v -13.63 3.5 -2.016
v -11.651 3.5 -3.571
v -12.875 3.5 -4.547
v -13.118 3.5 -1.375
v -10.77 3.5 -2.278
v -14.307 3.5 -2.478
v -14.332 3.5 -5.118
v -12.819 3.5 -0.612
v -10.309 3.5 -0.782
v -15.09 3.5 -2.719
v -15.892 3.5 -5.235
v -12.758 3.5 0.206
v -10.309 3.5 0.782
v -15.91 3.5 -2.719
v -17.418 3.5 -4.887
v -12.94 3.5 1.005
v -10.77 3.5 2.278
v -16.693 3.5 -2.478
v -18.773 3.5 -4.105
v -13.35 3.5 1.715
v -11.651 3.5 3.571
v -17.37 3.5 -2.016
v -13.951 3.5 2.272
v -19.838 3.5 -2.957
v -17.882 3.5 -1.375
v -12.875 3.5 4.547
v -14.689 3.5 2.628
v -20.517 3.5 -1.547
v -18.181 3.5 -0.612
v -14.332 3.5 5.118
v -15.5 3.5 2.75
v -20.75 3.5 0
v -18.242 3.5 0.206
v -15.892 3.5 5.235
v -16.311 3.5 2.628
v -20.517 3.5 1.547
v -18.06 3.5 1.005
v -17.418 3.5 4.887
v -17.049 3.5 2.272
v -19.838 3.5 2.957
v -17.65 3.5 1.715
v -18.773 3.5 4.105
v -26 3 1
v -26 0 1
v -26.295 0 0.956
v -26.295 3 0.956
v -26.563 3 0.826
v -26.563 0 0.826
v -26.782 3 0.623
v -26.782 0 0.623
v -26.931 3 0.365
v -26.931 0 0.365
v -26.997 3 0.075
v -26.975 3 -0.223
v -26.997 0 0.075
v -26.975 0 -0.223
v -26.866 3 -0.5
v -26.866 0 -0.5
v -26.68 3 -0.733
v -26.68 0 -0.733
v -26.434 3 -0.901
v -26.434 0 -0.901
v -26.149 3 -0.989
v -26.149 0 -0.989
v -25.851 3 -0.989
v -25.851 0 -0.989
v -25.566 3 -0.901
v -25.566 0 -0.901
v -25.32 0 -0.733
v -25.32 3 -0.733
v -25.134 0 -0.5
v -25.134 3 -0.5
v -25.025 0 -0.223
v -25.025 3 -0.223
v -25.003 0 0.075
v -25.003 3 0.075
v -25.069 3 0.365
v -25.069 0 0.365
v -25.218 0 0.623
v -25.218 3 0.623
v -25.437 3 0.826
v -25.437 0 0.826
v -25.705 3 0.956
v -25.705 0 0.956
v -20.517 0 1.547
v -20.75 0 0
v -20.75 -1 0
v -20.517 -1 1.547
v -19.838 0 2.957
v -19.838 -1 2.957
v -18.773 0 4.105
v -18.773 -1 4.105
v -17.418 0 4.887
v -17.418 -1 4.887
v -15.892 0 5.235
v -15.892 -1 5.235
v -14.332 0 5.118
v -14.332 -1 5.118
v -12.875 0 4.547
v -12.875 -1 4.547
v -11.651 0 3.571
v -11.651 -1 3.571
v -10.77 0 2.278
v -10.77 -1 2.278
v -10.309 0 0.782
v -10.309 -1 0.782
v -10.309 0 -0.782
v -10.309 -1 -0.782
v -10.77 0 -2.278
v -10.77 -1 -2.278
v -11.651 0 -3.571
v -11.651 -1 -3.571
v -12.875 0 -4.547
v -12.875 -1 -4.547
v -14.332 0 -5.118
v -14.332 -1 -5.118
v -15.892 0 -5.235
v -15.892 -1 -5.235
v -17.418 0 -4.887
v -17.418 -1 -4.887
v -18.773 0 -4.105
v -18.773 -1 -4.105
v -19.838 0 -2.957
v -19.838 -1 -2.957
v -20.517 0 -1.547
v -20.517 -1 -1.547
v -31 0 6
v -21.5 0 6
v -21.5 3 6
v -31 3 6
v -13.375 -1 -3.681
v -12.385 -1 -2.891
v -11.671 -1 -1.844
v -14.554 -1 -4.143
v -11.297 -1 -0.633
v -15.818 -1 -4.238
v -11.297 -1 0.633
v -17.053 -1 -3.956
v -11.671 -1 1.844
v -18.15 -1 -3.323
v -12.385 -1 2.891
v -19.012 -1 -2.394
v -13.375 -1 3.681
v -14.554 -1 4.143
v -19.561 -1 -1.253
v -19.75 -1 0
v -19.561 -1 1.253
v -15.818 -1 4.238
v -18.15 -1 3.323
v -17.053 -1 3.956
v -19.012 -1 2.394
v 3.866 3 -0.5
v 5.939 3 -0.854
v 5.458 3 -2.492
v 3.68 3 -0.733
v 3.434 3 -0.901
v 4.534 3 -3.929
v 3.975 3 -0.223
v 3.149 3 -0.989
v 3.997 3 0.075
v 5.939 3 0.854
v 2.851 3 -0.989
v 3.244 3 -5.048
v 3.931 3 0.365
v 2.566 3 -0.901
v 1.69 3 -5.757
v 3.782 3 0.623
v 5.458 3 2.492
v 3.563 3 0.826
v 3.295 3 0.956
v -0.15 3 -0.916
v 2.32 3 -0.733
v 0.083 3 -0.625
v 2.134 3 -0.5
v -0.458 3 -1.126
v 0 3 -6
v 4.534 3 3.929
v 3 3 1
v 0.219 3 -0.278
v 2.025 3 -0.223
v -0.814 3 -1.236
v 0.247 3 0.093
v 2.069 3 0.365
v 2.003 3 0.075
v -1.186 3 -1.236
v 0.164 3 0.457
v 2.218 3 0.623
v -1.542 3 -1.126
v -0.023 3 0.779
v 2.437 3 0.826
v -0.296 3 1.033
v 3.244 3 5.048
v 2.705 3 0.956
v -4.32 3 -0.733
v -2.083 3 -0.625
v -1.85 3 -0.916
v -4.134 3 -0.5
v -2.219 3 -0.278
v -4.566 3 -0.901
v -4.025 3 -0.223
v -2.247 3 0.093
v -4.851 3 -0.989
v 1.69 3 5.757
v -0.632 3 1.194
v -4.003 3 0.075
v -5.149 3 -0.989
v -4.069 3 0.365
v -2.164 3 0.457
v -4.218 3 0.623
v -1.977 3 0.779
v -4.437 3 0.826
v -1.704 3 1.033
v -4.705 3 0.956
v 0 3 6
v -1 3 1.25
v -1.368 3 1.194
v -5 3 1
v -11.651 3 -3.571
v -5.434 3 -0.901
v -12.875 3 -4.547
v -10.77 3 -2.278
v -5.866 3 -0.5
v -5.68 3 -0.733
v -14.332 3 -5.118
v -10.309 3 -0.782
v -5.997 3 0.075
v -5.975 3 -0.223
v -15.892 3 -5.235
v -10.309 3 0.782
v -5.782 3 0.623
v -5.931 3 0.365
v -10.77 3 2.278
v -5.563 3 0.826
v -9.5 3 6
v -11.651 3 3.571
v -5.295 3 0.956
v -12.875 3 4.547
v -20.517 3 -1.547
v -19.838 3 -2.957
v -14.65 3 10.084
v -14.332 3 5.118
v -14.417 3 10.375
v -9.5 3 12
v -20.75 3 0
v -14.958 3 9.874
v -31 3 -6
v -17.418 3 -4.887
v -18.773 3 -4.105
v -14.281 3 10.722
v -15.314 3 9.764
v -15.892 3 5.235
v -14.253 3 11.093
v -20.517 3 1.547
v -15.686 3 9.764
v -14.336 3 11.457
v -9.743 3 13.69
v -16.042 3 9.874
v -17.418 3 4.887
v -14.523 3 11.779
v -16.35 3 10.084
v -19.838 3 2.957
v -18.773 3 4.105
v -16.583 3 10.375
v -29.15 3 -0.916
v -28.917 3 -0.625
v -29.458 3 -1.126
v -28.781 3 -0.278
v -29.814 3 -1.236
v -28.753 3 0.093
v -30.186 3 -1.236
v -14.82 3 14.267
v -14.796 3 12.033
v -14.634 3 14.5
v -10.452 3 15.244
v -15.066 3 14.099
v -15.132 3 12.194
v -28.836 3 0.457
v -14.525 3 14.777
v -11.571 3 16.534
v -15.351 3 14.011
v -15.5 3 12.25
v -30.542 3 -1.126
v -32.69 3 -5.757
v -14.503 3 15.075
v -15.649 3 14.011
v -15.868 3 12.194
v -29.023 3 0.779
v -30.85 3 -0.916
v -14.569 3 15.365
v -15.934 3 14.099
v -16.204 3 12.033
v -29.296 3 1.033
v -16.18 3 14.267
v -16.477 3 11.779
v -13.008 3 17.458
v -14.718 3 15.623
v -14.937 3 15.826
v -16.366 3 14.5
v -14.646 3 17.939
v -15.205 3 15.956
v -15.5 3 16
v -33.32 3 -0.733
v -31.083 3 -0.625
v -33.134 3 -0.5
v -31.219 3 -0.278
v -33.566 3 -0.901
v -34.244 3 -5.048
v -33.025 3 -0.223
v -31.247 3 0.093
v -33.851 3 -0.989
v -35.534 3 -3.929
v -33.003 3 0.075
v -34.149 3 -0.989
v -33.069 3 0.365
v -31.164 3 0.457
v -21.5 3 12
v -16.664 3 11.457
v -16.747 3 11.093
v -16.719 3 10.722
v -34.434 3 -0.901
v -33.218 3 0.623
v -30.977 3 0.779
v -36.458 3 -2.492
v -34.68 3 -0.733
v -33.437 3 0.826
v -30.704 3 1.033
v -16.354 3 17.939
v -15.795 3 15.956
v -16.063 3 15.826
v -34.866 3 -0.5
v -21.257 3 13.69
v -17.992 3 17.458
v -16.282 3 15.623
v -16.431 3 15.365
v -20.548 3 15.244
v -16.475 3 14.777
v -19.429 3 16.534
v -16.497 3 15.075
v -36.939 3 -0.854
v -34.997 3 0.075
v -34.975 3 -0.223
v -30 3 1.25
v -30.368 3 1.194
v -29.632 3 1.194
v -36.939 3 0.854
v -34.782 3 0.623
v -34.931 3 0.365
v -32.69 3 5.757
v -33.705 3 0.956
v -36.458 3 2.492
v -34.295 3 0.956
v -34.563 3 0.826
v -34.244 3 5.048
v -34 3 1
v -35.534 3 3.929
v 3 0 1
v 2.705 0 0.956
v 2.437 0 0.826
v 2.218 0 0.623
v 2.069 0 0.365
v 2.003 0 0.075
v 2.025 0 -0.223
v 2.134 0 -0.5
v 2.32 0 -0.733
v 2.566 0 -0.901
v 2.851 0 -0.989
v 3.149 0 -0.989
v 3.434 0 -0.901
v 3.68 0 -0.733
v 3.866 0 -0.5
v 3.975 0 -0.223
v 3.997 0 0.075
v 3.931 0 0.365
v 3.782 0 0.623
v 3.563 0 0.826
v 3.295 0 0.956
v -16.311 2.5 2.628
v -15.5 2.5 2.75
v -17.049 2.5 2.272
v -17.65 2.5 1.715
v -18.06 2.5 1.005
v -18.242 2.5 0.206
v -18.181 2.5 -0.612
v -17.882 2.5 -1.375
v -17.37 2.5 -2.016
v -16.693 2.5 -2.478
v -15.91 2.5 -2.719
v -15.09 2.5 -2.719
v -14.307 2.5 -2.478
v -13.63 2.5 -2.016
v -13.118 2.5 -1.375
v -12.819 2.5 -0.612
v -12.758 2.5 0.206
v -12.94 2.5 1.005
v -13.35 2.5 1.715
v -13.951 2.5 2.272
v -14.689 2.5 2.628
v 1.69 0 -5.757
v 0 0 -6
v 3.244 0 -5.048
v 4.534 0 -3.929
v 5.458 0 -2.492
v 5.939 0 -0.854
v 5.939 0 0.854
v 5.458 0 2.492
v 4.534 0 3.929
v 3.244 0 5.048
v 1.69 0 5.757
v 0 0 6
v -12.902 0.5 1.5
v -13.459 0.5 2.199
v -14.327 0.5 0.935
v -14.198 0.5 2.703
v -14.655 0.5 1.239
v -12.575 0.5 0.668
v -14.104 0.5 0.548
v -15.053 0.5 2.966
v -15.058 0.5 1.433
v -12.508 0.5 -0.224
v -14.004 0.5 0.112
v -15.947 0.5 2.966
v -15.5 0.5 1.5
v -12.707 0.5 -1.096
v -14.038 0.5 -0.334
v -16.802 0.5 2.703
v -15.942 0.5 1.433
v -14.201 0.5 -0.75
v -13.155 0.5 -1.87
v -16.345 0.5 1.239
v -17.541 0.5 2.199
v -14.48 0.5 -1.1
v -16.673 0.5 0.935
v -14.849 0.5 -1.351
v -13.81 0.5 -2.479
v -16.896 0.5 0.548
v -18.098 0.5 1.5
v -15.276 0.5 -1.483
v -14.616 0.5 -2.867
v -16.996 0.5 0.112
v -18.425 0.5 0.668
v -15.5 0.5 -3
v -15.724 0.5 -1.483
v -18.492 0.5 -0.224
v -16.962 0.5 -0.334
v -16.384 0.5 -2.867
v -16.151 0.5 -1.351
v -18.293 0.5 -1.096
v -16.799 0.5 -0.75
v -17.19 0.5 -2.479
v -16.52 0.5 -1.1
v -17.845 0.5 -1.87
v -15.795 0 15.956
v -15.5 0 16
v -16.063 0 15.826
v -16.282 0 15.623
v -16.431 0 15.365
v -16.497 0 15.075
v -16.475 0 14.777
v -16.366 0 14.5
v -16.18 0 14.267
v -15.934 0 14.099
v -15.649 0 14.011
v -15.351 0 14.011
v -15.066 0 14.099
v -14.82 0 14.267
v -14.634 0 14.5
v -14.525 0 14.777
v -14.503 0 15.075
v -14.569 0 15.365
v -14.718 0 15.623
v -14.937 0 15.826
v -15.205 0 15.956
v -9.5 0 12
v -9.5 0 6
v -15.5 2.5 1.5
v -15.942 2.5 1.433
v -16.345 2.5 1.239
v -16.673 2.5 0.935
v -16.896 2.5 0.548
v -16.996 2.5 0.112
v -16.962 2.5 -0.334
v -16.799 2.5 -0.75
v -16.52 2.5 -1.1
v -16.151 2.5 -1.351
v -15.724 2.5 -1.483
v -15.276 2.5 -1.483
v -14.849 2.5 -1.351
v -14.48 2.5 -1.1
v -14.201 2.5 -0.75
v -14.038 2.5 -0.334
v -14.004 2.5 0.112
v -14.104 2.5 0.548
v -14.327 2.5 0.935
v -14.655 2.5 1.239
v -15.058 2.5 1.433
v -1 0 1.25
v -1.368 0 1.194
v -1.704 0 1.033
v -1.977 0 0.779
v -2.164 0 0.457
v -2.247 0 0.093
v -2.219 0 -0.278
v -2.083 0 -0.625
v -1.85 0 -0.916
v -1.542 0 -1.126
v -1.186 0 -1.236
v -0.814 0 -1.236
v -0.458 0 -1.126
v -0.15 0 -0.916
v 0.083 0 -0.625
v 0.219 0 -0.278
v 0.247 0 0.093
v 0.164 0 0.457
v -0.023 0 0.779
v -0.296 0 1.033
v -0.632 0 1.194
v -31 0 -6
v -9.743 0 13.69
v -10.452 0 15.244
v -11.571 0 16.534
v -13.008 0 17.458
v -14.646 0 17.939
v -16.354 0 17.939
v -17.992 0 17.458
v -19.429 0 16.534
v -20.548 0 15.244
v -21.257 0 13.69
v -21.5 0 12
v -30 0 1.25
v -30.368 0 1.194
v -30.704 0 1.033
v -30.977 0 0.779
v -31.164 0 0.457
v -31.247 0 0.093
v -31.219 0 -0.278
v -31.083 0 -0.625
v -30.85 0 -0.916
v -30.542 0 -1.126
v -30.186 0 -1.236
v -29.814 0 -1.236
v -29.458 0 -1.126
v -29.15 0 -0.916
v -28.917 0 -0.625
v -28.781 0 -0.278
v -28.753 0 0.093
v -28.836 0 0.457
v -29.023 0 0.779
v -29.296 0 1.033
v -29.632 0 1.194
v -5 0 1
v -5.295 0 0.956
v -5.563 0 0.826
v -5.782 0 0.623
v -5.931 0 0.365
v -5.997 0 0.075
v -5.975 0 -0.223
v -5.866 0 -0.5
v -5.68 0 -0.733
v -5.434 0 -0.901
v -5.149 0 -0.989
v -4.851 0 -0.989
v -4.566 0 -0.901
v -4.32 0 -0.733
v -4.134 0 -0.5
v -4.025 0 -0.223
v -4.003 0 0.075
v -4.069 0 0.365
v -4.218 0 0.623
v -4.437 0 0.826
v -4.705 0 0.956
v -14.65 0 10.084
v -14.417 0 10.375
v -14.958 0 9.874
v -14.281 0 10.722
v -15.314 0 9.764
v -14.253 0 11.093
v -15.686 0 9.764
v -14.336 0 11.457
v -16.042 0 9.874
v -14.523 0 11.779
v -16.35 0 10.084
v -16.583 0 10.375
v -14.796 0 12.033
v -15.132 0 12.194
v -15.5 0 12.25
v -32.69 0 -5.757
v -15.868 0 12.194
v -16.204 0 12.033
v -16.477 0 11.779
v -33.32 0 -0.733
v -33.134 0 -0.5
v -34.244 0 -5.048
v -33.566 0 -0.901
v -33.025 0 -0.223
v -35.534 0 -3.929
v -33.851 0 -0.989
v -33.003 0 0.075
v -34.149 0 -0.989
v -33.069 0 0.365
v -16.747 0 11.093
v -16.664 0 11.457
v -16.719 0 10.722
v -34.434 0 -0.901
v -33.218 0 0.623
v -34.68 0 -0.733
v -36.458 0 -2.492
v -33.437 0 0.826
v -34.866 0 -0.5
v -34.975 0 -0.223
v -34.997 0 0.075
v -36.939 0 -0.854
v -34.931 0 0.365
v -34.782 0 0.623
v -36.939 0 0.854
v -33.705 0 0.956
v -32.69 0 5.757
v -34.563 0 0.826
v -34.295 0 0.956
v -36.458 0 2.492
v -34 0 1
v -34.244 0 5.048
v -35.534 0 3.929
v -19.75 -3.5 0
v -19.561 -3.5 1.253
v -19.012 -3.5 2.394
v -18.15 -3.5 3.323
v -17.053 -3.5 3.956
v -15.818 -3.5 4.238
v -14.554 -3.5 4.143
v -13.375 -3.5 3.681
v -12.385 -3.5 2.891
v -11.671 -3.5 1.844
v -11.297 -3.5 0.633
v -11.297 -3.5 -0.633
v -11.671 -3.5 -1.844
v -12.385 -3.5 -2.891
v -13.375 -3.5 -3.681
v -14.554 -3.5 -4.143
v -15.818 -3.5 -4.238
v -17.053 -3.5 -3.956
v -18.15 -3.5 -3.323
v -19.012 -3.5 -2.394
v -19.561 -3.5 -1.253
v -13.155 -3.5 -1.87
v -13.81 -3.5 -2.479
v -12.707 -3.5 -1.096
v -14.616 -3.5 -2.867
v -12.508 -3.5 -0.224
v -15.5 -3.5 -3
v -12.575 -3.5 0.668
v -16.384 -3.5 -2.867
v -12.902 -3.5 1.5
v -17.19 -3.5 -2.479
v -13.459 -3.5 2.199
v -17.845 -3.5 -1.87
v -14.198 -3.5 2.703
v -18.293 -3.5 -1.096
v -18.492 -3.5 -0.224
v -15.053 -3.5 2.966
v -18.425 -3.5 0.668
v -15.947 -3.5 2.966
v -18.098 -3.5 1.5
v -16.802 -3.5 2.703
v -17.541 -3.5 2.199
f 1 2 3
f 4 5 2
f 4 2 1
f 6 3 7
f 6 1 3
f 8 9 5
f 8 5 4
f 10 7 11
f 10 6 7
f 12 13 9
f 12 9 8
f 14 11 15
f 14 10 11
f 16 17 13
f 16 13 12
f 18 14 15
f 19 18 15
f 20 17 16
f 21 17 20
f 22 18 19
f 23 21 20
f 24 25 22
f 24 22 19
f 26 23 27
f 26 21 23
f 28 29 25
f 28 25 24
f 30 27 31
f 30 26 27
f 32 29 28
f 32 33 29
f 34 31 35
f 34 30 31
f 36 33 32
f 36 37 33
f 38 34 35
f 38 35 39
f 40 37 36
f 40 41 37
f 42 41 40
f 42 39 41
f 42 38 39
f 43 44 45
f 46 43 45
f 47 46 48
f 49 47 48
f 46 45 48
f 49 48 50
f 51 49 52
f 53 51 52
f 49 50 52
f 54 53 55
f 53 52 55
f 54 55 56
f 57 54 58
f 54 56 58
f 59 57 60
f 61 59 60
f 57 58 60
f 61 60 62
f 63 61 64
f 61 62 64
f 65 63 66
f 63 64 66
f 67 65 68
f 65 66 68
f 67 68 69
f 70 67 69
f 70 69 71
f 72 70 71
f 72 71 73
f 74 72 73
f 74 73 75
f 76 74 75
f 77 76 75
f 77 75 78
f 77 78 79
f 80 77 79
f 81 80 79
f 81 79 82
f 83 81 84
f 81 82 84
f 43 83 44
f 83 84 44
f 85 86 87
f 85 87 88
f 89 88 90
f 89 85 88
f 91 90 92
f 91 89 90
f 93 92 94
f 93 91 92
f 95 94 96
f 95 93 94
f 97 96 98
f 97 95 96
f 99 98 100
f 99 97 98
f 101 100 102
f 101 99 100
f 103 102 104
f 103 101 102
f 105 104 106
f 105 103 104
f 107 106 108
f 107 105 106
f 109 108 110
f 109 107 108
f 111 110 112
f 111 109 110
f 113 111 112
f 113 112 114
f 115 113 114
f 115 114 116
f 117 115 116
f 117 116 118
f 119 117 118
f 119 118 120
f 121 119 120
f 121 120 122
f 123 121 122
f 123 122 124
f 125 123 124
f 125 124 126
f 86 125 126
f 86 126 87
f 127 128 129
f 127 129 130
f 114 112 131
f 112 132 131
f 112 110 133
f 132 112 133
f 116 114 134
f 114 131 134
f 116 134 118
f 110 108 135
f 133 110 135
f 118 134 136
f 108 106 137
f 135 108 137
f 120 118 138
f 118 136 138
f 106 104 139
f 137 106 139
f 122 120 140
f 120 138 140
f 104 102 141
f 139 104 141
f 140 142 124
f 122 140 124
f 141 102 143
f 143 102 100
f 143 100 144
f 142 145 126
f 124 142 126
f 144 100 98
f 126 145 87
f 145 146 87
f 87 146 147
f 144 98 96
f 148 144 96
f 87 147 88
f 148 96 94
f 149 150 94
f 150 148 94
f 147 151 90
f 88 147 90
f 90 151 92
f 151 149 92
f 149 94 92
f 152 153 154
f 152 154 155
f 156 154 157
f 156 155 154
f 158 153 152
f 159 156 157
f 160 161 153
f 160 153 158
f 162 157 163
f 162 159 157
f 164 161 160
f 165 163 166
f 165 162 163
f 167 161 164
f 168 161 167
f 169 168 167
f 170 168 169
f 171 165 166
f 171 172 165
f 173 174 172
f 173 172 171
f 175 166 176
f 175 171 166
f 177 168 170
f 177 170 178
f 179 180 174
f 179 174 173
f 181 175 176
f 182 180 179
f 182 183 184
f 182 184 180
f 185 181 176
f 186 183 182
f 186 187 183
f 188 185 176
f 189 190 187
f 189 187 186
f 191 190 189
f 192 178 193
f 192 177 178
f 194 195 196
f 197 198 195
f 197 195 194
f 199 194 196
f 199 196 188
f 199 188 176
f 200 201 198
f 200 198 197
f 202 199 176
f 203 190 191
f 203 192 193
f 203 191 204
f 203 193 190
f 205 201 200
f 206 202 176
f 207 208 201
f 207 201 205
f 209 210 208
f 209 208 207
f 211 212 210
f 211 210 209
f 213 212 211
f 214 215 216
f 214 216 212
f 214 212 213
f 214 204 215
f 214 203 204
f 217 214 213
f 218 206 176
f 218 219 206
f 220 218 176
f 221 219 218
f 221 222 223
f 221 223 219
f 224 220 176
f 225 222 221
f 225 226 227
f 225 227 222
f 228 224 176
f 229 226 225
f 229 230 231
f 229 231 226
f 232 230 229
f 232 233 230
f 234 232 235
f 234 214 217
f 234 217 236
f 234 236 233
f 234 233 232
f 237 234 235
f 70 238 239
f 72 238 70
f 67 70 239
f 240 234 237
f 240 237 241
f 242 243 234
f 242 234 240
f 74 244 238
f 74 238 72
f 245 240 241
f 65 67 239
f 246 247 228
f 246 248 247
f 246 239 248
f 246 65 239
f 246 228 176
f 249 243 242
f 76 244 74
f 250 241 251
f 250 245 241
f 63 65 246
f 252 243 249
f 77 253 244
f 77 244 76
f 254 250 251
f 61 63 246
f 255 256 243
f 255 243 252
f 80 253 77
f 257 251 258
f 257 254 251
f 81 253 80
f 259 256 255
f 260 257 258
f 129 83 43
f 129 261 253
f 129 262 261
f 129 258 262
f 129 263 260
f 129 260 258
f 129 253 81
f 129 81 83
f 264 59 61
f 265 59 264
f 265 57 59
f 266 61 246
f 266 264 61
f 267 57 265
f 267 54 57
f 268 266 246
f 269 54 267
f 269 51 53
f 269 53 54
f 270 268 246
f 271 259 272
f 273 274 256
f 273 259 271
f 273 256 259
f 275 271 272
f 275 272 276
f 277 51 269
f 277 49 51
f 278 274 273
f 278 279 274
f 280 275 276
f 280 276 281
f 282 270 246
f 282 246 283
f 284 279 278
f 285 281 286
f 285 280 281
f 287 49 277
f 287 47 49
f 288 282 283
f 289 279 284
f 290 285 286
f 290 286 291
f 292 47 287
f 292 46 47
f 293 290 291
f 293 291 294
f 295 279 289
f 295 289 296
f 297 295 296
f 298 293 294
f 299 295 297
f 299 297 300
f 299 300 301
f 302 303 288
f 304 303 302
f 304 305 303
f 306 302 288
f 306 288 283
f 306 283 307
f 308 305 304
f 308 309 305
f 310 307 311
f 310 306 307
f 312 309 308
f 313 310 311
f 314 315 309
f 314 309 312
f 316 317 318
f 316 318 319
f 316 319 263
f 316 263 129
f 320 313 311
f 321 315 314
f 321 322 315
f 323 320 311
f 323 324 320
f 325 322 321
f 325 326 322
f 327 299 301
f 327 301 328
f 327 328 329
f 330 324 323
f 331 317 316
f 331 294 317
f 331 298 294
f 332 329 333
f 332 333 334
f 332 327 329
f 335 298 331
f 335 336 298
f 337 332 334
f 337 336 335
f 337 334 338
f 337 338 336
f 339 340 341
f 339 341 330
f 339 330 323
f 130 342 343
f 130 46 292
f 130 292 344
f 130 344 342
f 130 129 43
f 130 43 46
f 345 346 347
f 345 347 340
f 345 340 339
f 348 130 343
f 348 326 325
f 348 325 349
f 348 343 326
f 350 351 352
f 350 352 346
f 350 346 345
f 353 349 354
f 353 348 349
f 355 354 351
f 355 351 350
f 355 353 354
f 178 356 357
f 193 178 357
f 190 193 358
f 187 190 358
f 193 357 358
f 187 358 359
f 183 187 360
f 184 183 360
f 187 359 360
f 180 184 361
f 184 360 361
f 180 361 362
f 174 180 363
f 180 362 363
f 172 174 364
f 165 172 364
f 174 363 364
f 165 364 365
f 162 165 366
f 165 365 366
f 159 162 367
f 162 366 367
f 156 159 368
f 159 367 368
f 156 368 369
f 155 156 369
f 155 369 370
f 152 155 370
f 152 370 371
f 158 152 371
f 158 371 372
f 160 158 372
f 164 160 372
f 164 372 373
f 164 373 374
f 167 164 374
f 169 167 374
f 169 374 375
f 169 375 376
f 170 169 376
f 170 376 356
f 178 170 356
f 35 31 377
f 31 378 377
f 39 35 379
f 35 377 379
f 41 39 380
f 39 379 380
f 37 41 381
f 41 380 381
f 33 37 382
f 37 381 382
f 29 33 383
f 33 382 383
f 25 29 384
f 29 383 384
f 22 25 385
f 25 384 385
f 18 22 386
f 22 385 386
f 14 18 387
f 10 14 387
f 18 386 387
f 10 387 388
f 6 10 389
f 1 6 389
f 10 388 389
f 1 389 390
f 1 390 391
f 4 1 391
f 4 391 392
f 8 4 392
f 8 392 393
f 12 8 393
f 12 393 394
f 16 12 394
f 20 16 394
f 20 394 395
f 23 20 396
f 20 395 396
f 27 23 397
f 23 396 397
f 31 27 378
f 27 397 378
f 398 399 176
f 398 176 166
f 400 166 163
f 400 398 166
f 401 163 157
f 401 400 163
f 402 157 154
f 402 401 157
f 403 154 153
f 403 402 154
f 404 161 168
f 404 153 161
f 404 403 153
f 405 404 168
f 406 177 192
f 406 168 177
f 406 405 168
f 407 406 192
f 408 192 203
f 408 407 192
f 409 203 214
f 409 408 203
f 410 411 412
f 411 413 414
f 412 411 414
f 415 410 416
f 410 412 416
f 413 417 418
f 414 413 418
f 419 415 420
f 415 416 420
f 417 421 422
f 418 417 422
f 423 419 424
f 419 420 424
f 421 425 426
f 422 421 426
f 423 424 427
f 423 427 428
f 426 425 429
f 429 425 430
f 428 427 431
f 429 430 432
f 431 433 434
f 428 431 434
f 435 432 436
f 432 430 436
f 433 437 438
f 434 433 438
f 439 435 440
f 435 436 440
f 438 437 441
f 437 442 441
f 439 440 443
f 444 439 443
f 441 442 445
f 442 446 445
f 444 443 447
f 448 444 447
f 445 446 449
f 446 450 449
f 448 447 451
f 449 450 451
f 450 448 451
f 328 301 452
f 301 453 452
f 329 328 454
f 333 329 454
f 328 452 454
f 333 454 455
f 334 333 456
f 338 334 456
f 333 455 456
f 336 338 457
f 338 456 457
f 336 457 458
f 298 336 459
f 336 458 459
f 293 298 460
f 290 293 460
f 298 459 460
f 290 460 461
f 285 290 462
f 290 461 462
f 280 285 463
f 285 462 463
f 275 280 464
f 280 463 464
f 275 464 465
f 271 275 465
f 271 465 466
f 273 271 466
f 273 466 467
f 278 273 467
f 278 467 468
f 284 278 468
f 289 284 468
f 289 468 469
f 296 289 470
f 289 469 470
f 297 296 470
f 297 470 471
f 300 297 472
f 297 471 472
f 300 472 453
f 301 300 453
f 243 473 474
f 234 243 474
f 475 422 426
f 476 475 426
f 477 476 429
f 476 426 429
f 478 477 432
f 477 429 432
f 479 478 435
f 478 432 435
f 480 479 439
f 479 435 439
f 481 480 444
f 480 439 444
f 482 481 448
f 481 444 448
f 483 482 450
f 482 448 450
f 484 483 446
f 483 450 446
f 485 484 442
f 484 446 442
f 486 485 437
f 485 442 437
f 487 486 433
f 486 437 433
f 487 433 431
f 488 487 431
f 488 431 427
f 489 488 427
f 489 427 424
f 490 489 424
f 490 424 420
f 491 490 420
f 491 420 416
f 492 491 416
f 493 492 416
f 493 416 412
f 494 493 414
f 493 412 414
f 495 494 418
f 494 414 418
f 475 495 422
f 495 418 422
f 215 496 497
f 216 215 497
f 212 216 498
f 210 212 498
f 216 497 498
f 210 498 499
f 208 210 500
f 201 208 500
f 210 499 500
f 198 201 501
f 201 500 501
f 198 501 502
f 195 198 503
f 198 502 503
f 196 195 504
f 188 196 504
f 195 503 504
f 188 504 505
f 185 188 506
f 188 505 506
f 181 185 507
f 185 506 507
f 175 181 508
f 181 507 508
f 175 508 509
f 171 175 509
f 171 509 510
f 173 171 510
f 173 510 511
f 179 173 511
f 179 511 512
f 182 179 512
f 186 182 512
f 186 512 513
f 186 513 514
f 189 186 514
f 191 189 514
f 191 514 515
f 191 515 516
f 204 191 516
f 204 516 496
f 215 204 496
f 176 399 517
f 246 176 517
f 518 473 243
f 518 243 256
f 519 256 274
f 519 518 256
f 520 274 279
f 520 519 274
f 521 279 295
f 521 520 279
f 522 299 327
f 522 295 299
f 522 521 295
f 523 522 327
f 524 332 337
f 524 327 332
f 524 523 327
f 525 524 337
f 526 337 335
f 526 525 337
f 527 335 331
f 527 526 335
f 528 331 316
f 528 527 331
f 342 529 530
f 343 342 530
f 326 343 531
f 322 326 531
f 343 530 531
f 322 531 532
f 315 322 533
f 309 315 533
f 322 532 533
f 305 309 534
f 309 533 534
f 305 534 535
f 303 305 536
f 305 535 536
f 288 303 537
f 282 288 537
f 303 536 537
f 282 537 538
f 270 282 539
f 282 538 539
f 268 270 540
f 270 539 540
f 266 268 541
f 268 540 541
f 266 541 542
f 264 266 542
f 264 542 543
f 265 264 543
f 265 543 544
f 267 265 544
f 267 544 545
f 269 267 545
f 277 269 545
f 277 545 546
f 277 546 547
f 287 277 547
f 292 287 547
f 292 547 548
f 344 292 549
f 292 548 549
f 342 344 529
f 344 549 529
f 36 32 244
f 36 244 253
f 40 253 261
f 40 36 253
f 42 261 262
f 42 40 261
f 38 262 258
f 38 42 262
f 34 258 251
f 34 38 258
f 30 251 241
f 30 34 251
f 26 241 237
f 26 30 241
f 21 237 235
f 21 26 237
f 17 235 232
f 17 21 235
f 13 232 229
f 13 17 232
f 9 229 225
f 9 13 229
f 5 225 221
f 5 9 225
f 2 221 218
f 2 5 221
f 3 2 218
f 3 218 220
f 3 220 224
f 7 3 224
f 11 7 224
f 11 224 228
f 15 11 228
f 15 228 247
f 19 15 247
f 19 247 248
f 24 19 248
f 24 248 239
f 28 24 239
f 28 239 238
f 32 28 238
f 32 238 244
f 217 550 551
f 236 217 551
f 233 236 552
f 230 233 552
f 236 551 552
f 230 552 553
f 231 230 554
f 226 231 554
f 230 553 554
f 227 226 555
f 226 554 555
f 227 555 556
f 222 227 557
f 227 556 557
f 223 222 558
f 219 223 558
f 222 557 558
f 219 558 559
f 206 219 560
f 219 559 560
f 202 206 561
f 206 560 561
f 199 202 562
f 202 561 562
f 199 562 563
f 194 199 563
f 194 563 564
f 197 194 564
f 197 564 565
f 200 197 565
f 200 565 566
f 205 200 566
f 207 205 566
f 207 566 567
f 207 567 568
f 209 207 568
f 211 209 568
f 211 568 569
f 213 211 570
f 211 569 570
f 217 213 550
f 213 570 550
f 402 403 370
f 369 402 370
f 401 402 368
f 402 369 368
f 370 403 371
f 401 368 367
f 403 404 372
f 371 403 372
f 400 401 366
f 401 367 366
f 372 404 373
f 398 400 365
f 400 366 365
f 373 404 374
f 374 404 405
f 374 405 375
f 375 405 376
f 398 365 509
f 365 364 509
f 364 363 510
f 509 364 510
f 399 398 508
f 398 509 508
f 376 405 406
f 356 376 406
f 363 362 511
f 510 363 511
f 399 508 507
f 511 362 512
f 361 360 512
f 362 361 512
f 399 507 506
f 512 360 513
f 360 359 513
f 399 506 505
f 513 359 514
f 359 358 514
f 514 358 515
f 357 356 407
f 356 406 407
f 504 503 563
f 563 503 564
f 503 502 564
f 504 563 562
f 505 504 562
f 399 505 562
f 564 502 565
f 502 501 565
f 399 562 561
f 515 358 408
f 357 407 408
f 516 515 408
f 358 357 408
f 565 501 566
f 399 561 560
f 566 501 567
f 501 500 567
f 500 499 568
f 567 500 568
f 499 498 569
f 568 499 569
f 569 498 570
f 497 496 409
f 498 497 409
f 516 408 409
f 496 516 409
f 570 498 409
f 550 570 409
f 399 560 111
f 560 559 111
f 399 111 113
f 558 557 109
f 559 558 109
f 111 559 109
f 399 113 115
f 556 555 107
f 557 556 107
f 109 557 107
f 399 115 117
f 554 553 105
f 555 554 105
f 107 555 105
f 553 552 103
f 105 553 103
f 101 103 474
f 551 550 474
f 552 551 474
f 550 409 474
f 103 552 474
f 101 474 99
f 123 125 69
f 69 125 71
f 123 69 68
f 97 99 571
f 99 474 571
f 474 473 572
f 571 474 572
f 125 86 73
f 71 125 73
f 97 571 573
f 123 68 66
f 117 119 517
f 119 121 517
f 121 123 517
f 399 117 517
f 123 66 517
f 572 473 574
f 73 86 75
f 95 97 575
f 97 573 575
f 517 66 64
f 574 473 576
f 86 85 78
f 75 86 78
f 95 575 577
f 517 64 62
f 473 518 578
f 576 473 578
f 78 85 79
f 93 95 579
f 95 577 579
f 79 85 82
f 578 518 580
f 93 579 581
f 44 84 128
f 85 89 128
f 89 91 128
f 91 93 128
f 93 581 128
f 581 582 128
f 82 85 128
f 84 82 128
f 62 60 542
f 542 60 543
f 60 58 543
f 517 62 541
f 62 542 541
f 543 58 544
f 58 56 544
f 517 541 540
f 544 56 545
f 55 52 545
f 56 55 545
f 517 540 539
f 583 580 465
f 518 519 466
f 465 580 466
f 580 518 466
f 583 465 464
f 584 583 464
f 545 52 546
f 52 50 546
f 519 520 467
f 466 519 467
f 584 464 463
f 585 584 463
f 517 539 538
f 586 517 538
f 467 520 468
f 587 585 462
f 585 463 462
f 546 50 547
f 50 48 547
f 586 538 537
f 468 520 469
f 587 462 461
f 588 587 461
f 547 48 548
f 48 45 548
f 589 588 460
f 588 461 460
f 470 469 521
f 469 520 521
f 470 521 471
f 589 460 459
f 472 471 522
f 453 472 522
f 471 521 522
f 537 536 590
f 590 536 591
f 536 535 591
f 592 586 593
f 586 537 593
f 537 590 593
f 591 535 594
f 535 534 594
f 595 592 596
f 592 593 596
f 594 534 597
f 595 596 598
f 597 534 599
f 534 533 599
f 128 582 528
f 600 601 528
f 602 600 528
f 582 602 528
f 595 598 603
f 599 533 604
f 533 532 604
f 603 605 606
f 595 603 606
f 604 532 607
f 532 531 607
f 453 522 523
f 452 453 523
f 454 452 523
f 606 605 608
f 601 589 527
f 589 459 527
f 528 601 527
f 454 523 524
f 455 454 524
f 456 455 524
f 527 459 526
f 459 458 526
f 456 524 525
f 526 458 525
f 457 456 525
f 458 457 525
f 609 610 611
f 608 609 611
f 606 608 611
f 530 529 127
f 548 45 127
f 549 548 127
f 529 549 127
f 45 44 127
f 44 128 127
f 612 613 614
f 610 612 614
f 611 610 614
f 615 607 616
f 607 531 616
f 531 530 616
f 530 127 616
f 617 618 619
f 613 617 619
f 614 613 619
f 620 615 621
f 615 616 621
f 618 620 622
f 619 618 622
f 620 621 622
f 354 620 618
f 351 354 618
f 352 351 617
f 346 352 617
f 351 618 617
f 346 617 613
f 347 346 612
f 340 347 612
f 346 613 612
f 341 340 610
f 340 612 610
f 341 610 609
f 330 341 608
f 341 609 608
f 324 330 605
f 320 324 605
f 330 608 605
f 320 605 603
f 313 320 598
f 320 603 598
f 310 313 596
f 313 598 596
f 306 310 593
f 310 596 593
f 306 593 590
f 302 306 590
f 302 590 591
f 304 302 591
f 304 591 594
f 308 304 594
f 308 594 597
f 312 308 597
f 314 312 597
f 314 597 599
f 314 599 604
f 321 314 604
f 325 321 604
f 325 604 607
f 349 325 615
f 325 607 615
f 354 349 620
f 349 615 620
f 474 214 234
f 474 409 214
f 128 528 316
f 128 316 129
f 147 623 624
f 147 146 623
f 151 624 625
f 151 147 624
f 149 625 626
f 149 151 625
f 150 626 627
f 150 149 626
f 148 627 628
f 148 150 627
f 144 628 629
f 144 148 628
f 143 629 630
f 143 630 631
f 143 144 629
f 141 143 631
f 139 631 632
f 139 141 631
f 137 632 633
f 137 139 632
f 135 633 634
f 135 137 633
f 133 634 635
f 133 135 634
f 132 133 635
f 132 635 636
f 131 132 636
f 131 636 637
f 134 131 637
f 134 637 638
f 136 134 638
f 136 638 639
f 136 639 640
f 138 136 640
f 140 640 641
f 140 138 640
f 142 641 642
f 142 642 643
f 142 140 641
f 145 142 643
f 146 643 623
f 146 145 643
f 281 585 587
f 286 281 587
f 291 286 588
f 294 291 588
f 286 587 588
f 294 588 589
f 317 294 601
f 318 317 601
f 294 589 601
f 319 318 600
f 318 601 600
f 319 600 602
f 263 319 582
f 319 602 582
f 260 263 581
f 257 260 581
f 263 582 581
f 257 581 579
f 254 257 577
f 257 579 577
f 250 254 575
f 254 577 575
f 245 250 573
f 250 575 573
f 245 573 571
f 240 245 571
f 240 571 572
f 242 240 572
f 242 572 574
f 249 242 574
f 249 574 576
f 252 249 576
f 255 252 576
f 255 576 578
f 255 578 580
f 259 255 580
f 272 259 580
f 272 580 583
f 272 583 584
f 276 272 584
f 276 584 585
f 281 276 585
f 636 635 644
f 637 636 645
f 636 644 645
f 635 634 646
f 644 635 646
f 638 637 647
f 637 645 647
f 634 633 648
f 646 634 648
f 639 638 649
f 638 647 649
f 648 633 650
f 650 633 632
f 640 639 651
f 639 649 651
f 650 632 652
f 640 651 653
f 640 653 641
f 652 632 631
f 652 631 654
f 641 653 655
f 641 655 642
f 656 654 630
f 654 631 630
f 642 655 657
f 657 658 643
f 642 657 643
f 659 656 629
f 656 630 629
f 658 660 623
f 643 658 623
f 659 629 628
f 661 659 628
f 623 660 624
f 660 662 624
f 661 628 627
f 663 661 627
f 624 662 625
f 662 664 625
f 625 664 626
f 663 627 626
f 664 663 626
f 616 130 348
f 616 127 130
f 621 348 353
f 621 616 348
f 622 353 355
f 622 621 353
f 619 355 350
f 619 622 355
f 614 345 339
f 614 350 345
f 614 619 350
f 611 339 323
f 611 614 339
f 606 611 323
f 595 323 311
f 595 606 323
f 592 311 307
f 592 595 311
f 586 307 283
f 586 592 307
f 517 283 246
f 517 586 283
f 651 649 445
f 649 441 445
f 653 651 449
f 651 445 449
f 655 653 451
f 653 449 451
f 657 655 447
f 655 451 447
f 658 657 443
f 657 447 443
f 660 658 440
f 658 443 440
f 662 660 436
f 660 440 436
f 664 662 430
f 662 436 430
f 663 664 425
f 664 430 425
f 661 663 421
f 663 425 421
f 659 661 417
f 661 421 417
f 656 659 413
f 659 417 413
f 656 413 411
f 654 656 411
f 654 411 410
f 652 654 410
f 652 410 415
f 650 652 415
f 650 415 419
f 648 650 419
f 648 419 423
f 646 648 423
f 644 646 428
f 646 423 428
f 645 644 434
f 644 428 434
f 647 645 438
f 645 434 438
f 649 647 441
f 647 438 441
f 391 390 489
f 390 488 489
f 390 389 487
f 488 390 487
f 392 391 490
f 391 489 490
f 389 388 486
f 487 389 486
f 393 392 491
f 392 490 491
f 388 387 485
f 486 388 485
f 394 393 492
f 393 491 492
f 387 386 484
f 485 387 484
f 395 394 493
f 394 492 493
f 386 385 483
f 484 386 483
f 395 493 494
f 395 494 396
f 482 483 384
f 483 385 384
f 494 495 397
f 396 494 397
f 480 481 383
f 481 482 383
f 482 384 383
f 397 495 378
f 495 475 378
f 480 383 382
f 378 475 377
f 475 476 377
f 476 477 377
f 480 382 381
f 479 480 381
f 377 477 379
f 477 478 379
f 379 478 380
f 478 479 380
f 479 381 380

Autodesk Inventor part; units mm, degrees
ref_plane "YZ Plane" through (0, 0, 0) normal (1, 0, 0) x (0, 1, 0)
ref_plane "XZ Plane" through (0, 0, 0) normal (0, 1, 0) x (-1, 0, 0)
ref_plane "XY Plane" through (0, 0, 0) normal (0, 0, 1) x (1, 0, 0)
sketch "Sketch1" plane through (0, 0, 0) normal (0, 1, 0) x (-1, 0, 0)
  circle A0 centre (0, 0) radius 6
  line L0 (0, 0) -> (6, 0) construction
  line L1 (0, 0) -> (0, 6) construction
  circle A1 centre (15.5, 0) radius 6
  circle A2 centre (31, 0) radius 6
  circle A3 centre (0, 12) radius 6
  circle A4 centre (15.5, 12) radius 6
  circle A5 centre (31, 12) radius 6
  circle A6 centre (15.5, 0) radius 5.25
  line L2 (0, 6) -> (31, 6)
  line L3 (0, -6) -> (31, -6)
  line L4 (9.5, 12) -> (9.5, 0)
  line L5 (21.5, 12) -> (21.5, 0)
  circle A7 centre (15.5, 0) radius 4.25
  point P0 (37, 0)
  point P1 (6, 12)
  point P2 (37, 12)
  dimension "d1" = 12
  dimension "d4" = 15.5
  dimension "d7" = 12
  dimension "d10" = 10.5
  dimension "d17" = 8.5
extrude "Extrusion1" add sketch "Sketch1" along normal blind 3 contours A0 | A0 L2 L4 A1 L3 | L4 A4 L2 | L2 A1 L4 | A1 | A1 L5 L2 A2 L3 | L2 L5 A1 | A4 | A4 L5 L2 | A2 | A6 | A7
extrude "Extrusion2" add sketch "Sketch1" along normal blind 3.5 and the other way blind 1 contours A6 | A7
extrude "Extrusion3" add sketch "Sketch1" against normal blind 3.5 contours A7
sketch "Sketch2" plane through (0, 3, 0) normal (0, 1, 0) x (1, 0, 0)
  circle A0 centre (-15.5, 0) radius 5.25 projected
  arc A1 (-21.5, -12) -> (-9.5, -12) centre (-15.5, -12) ccw projected
  arc A2 (0, -6) -> (0, 6) centre (0, 0) ccw projected
  arc A3 (-31, 6) -> (-31, -6) centre (-31, 0) ccw projected
  line L0 (-37, 0) -> (6, 0) construction
  line L1 (-15.5, 0) -> (-15.5, -18) construction
  point P0 (-26, 0)
  point P1 (-30, 0)
  point P2 (-34, 0)
  point P3 (-15.5, -15)
  point P4 (-15.5, -11)
  point P5 (-5, 0)
  point P6 (-1, 0)
  point P7 (3, 0)
  dimension "d20" = 11
  dimension "d22" = 15
  dimension "d23" = 10.5
  dimension "d24" = 14.5
  dimension "d25" = 18.5
hole "Hole1" at (-26, 3, 0) at (-34, 3, 0) at (-15.5, 3, 15) at (3, 3, 0) at (-5, 3, 0) direction (0, -1, 0) diameter 2 end through all
hole "Hole2" at (-30, 3, 0) at (-15.5, 3, 11) at (-1, 3, 0) direction (0, -1, 0) diameter 2.5 end through all
hole "Hole3" at (-15.5, 3.5, 0) direction (0, -1, 0) diameter 5.5 depth 1
hole "Hole4" at (-15.5, 3.5, 0) direction (0, -1, 0) diameter 3 end through all
hole "Hole5" at (-15.5, -3.5, 0) direction (0, 1, 0) diameter 6 depth 4
properties part number "servo arm BMS-630MG tripple"
